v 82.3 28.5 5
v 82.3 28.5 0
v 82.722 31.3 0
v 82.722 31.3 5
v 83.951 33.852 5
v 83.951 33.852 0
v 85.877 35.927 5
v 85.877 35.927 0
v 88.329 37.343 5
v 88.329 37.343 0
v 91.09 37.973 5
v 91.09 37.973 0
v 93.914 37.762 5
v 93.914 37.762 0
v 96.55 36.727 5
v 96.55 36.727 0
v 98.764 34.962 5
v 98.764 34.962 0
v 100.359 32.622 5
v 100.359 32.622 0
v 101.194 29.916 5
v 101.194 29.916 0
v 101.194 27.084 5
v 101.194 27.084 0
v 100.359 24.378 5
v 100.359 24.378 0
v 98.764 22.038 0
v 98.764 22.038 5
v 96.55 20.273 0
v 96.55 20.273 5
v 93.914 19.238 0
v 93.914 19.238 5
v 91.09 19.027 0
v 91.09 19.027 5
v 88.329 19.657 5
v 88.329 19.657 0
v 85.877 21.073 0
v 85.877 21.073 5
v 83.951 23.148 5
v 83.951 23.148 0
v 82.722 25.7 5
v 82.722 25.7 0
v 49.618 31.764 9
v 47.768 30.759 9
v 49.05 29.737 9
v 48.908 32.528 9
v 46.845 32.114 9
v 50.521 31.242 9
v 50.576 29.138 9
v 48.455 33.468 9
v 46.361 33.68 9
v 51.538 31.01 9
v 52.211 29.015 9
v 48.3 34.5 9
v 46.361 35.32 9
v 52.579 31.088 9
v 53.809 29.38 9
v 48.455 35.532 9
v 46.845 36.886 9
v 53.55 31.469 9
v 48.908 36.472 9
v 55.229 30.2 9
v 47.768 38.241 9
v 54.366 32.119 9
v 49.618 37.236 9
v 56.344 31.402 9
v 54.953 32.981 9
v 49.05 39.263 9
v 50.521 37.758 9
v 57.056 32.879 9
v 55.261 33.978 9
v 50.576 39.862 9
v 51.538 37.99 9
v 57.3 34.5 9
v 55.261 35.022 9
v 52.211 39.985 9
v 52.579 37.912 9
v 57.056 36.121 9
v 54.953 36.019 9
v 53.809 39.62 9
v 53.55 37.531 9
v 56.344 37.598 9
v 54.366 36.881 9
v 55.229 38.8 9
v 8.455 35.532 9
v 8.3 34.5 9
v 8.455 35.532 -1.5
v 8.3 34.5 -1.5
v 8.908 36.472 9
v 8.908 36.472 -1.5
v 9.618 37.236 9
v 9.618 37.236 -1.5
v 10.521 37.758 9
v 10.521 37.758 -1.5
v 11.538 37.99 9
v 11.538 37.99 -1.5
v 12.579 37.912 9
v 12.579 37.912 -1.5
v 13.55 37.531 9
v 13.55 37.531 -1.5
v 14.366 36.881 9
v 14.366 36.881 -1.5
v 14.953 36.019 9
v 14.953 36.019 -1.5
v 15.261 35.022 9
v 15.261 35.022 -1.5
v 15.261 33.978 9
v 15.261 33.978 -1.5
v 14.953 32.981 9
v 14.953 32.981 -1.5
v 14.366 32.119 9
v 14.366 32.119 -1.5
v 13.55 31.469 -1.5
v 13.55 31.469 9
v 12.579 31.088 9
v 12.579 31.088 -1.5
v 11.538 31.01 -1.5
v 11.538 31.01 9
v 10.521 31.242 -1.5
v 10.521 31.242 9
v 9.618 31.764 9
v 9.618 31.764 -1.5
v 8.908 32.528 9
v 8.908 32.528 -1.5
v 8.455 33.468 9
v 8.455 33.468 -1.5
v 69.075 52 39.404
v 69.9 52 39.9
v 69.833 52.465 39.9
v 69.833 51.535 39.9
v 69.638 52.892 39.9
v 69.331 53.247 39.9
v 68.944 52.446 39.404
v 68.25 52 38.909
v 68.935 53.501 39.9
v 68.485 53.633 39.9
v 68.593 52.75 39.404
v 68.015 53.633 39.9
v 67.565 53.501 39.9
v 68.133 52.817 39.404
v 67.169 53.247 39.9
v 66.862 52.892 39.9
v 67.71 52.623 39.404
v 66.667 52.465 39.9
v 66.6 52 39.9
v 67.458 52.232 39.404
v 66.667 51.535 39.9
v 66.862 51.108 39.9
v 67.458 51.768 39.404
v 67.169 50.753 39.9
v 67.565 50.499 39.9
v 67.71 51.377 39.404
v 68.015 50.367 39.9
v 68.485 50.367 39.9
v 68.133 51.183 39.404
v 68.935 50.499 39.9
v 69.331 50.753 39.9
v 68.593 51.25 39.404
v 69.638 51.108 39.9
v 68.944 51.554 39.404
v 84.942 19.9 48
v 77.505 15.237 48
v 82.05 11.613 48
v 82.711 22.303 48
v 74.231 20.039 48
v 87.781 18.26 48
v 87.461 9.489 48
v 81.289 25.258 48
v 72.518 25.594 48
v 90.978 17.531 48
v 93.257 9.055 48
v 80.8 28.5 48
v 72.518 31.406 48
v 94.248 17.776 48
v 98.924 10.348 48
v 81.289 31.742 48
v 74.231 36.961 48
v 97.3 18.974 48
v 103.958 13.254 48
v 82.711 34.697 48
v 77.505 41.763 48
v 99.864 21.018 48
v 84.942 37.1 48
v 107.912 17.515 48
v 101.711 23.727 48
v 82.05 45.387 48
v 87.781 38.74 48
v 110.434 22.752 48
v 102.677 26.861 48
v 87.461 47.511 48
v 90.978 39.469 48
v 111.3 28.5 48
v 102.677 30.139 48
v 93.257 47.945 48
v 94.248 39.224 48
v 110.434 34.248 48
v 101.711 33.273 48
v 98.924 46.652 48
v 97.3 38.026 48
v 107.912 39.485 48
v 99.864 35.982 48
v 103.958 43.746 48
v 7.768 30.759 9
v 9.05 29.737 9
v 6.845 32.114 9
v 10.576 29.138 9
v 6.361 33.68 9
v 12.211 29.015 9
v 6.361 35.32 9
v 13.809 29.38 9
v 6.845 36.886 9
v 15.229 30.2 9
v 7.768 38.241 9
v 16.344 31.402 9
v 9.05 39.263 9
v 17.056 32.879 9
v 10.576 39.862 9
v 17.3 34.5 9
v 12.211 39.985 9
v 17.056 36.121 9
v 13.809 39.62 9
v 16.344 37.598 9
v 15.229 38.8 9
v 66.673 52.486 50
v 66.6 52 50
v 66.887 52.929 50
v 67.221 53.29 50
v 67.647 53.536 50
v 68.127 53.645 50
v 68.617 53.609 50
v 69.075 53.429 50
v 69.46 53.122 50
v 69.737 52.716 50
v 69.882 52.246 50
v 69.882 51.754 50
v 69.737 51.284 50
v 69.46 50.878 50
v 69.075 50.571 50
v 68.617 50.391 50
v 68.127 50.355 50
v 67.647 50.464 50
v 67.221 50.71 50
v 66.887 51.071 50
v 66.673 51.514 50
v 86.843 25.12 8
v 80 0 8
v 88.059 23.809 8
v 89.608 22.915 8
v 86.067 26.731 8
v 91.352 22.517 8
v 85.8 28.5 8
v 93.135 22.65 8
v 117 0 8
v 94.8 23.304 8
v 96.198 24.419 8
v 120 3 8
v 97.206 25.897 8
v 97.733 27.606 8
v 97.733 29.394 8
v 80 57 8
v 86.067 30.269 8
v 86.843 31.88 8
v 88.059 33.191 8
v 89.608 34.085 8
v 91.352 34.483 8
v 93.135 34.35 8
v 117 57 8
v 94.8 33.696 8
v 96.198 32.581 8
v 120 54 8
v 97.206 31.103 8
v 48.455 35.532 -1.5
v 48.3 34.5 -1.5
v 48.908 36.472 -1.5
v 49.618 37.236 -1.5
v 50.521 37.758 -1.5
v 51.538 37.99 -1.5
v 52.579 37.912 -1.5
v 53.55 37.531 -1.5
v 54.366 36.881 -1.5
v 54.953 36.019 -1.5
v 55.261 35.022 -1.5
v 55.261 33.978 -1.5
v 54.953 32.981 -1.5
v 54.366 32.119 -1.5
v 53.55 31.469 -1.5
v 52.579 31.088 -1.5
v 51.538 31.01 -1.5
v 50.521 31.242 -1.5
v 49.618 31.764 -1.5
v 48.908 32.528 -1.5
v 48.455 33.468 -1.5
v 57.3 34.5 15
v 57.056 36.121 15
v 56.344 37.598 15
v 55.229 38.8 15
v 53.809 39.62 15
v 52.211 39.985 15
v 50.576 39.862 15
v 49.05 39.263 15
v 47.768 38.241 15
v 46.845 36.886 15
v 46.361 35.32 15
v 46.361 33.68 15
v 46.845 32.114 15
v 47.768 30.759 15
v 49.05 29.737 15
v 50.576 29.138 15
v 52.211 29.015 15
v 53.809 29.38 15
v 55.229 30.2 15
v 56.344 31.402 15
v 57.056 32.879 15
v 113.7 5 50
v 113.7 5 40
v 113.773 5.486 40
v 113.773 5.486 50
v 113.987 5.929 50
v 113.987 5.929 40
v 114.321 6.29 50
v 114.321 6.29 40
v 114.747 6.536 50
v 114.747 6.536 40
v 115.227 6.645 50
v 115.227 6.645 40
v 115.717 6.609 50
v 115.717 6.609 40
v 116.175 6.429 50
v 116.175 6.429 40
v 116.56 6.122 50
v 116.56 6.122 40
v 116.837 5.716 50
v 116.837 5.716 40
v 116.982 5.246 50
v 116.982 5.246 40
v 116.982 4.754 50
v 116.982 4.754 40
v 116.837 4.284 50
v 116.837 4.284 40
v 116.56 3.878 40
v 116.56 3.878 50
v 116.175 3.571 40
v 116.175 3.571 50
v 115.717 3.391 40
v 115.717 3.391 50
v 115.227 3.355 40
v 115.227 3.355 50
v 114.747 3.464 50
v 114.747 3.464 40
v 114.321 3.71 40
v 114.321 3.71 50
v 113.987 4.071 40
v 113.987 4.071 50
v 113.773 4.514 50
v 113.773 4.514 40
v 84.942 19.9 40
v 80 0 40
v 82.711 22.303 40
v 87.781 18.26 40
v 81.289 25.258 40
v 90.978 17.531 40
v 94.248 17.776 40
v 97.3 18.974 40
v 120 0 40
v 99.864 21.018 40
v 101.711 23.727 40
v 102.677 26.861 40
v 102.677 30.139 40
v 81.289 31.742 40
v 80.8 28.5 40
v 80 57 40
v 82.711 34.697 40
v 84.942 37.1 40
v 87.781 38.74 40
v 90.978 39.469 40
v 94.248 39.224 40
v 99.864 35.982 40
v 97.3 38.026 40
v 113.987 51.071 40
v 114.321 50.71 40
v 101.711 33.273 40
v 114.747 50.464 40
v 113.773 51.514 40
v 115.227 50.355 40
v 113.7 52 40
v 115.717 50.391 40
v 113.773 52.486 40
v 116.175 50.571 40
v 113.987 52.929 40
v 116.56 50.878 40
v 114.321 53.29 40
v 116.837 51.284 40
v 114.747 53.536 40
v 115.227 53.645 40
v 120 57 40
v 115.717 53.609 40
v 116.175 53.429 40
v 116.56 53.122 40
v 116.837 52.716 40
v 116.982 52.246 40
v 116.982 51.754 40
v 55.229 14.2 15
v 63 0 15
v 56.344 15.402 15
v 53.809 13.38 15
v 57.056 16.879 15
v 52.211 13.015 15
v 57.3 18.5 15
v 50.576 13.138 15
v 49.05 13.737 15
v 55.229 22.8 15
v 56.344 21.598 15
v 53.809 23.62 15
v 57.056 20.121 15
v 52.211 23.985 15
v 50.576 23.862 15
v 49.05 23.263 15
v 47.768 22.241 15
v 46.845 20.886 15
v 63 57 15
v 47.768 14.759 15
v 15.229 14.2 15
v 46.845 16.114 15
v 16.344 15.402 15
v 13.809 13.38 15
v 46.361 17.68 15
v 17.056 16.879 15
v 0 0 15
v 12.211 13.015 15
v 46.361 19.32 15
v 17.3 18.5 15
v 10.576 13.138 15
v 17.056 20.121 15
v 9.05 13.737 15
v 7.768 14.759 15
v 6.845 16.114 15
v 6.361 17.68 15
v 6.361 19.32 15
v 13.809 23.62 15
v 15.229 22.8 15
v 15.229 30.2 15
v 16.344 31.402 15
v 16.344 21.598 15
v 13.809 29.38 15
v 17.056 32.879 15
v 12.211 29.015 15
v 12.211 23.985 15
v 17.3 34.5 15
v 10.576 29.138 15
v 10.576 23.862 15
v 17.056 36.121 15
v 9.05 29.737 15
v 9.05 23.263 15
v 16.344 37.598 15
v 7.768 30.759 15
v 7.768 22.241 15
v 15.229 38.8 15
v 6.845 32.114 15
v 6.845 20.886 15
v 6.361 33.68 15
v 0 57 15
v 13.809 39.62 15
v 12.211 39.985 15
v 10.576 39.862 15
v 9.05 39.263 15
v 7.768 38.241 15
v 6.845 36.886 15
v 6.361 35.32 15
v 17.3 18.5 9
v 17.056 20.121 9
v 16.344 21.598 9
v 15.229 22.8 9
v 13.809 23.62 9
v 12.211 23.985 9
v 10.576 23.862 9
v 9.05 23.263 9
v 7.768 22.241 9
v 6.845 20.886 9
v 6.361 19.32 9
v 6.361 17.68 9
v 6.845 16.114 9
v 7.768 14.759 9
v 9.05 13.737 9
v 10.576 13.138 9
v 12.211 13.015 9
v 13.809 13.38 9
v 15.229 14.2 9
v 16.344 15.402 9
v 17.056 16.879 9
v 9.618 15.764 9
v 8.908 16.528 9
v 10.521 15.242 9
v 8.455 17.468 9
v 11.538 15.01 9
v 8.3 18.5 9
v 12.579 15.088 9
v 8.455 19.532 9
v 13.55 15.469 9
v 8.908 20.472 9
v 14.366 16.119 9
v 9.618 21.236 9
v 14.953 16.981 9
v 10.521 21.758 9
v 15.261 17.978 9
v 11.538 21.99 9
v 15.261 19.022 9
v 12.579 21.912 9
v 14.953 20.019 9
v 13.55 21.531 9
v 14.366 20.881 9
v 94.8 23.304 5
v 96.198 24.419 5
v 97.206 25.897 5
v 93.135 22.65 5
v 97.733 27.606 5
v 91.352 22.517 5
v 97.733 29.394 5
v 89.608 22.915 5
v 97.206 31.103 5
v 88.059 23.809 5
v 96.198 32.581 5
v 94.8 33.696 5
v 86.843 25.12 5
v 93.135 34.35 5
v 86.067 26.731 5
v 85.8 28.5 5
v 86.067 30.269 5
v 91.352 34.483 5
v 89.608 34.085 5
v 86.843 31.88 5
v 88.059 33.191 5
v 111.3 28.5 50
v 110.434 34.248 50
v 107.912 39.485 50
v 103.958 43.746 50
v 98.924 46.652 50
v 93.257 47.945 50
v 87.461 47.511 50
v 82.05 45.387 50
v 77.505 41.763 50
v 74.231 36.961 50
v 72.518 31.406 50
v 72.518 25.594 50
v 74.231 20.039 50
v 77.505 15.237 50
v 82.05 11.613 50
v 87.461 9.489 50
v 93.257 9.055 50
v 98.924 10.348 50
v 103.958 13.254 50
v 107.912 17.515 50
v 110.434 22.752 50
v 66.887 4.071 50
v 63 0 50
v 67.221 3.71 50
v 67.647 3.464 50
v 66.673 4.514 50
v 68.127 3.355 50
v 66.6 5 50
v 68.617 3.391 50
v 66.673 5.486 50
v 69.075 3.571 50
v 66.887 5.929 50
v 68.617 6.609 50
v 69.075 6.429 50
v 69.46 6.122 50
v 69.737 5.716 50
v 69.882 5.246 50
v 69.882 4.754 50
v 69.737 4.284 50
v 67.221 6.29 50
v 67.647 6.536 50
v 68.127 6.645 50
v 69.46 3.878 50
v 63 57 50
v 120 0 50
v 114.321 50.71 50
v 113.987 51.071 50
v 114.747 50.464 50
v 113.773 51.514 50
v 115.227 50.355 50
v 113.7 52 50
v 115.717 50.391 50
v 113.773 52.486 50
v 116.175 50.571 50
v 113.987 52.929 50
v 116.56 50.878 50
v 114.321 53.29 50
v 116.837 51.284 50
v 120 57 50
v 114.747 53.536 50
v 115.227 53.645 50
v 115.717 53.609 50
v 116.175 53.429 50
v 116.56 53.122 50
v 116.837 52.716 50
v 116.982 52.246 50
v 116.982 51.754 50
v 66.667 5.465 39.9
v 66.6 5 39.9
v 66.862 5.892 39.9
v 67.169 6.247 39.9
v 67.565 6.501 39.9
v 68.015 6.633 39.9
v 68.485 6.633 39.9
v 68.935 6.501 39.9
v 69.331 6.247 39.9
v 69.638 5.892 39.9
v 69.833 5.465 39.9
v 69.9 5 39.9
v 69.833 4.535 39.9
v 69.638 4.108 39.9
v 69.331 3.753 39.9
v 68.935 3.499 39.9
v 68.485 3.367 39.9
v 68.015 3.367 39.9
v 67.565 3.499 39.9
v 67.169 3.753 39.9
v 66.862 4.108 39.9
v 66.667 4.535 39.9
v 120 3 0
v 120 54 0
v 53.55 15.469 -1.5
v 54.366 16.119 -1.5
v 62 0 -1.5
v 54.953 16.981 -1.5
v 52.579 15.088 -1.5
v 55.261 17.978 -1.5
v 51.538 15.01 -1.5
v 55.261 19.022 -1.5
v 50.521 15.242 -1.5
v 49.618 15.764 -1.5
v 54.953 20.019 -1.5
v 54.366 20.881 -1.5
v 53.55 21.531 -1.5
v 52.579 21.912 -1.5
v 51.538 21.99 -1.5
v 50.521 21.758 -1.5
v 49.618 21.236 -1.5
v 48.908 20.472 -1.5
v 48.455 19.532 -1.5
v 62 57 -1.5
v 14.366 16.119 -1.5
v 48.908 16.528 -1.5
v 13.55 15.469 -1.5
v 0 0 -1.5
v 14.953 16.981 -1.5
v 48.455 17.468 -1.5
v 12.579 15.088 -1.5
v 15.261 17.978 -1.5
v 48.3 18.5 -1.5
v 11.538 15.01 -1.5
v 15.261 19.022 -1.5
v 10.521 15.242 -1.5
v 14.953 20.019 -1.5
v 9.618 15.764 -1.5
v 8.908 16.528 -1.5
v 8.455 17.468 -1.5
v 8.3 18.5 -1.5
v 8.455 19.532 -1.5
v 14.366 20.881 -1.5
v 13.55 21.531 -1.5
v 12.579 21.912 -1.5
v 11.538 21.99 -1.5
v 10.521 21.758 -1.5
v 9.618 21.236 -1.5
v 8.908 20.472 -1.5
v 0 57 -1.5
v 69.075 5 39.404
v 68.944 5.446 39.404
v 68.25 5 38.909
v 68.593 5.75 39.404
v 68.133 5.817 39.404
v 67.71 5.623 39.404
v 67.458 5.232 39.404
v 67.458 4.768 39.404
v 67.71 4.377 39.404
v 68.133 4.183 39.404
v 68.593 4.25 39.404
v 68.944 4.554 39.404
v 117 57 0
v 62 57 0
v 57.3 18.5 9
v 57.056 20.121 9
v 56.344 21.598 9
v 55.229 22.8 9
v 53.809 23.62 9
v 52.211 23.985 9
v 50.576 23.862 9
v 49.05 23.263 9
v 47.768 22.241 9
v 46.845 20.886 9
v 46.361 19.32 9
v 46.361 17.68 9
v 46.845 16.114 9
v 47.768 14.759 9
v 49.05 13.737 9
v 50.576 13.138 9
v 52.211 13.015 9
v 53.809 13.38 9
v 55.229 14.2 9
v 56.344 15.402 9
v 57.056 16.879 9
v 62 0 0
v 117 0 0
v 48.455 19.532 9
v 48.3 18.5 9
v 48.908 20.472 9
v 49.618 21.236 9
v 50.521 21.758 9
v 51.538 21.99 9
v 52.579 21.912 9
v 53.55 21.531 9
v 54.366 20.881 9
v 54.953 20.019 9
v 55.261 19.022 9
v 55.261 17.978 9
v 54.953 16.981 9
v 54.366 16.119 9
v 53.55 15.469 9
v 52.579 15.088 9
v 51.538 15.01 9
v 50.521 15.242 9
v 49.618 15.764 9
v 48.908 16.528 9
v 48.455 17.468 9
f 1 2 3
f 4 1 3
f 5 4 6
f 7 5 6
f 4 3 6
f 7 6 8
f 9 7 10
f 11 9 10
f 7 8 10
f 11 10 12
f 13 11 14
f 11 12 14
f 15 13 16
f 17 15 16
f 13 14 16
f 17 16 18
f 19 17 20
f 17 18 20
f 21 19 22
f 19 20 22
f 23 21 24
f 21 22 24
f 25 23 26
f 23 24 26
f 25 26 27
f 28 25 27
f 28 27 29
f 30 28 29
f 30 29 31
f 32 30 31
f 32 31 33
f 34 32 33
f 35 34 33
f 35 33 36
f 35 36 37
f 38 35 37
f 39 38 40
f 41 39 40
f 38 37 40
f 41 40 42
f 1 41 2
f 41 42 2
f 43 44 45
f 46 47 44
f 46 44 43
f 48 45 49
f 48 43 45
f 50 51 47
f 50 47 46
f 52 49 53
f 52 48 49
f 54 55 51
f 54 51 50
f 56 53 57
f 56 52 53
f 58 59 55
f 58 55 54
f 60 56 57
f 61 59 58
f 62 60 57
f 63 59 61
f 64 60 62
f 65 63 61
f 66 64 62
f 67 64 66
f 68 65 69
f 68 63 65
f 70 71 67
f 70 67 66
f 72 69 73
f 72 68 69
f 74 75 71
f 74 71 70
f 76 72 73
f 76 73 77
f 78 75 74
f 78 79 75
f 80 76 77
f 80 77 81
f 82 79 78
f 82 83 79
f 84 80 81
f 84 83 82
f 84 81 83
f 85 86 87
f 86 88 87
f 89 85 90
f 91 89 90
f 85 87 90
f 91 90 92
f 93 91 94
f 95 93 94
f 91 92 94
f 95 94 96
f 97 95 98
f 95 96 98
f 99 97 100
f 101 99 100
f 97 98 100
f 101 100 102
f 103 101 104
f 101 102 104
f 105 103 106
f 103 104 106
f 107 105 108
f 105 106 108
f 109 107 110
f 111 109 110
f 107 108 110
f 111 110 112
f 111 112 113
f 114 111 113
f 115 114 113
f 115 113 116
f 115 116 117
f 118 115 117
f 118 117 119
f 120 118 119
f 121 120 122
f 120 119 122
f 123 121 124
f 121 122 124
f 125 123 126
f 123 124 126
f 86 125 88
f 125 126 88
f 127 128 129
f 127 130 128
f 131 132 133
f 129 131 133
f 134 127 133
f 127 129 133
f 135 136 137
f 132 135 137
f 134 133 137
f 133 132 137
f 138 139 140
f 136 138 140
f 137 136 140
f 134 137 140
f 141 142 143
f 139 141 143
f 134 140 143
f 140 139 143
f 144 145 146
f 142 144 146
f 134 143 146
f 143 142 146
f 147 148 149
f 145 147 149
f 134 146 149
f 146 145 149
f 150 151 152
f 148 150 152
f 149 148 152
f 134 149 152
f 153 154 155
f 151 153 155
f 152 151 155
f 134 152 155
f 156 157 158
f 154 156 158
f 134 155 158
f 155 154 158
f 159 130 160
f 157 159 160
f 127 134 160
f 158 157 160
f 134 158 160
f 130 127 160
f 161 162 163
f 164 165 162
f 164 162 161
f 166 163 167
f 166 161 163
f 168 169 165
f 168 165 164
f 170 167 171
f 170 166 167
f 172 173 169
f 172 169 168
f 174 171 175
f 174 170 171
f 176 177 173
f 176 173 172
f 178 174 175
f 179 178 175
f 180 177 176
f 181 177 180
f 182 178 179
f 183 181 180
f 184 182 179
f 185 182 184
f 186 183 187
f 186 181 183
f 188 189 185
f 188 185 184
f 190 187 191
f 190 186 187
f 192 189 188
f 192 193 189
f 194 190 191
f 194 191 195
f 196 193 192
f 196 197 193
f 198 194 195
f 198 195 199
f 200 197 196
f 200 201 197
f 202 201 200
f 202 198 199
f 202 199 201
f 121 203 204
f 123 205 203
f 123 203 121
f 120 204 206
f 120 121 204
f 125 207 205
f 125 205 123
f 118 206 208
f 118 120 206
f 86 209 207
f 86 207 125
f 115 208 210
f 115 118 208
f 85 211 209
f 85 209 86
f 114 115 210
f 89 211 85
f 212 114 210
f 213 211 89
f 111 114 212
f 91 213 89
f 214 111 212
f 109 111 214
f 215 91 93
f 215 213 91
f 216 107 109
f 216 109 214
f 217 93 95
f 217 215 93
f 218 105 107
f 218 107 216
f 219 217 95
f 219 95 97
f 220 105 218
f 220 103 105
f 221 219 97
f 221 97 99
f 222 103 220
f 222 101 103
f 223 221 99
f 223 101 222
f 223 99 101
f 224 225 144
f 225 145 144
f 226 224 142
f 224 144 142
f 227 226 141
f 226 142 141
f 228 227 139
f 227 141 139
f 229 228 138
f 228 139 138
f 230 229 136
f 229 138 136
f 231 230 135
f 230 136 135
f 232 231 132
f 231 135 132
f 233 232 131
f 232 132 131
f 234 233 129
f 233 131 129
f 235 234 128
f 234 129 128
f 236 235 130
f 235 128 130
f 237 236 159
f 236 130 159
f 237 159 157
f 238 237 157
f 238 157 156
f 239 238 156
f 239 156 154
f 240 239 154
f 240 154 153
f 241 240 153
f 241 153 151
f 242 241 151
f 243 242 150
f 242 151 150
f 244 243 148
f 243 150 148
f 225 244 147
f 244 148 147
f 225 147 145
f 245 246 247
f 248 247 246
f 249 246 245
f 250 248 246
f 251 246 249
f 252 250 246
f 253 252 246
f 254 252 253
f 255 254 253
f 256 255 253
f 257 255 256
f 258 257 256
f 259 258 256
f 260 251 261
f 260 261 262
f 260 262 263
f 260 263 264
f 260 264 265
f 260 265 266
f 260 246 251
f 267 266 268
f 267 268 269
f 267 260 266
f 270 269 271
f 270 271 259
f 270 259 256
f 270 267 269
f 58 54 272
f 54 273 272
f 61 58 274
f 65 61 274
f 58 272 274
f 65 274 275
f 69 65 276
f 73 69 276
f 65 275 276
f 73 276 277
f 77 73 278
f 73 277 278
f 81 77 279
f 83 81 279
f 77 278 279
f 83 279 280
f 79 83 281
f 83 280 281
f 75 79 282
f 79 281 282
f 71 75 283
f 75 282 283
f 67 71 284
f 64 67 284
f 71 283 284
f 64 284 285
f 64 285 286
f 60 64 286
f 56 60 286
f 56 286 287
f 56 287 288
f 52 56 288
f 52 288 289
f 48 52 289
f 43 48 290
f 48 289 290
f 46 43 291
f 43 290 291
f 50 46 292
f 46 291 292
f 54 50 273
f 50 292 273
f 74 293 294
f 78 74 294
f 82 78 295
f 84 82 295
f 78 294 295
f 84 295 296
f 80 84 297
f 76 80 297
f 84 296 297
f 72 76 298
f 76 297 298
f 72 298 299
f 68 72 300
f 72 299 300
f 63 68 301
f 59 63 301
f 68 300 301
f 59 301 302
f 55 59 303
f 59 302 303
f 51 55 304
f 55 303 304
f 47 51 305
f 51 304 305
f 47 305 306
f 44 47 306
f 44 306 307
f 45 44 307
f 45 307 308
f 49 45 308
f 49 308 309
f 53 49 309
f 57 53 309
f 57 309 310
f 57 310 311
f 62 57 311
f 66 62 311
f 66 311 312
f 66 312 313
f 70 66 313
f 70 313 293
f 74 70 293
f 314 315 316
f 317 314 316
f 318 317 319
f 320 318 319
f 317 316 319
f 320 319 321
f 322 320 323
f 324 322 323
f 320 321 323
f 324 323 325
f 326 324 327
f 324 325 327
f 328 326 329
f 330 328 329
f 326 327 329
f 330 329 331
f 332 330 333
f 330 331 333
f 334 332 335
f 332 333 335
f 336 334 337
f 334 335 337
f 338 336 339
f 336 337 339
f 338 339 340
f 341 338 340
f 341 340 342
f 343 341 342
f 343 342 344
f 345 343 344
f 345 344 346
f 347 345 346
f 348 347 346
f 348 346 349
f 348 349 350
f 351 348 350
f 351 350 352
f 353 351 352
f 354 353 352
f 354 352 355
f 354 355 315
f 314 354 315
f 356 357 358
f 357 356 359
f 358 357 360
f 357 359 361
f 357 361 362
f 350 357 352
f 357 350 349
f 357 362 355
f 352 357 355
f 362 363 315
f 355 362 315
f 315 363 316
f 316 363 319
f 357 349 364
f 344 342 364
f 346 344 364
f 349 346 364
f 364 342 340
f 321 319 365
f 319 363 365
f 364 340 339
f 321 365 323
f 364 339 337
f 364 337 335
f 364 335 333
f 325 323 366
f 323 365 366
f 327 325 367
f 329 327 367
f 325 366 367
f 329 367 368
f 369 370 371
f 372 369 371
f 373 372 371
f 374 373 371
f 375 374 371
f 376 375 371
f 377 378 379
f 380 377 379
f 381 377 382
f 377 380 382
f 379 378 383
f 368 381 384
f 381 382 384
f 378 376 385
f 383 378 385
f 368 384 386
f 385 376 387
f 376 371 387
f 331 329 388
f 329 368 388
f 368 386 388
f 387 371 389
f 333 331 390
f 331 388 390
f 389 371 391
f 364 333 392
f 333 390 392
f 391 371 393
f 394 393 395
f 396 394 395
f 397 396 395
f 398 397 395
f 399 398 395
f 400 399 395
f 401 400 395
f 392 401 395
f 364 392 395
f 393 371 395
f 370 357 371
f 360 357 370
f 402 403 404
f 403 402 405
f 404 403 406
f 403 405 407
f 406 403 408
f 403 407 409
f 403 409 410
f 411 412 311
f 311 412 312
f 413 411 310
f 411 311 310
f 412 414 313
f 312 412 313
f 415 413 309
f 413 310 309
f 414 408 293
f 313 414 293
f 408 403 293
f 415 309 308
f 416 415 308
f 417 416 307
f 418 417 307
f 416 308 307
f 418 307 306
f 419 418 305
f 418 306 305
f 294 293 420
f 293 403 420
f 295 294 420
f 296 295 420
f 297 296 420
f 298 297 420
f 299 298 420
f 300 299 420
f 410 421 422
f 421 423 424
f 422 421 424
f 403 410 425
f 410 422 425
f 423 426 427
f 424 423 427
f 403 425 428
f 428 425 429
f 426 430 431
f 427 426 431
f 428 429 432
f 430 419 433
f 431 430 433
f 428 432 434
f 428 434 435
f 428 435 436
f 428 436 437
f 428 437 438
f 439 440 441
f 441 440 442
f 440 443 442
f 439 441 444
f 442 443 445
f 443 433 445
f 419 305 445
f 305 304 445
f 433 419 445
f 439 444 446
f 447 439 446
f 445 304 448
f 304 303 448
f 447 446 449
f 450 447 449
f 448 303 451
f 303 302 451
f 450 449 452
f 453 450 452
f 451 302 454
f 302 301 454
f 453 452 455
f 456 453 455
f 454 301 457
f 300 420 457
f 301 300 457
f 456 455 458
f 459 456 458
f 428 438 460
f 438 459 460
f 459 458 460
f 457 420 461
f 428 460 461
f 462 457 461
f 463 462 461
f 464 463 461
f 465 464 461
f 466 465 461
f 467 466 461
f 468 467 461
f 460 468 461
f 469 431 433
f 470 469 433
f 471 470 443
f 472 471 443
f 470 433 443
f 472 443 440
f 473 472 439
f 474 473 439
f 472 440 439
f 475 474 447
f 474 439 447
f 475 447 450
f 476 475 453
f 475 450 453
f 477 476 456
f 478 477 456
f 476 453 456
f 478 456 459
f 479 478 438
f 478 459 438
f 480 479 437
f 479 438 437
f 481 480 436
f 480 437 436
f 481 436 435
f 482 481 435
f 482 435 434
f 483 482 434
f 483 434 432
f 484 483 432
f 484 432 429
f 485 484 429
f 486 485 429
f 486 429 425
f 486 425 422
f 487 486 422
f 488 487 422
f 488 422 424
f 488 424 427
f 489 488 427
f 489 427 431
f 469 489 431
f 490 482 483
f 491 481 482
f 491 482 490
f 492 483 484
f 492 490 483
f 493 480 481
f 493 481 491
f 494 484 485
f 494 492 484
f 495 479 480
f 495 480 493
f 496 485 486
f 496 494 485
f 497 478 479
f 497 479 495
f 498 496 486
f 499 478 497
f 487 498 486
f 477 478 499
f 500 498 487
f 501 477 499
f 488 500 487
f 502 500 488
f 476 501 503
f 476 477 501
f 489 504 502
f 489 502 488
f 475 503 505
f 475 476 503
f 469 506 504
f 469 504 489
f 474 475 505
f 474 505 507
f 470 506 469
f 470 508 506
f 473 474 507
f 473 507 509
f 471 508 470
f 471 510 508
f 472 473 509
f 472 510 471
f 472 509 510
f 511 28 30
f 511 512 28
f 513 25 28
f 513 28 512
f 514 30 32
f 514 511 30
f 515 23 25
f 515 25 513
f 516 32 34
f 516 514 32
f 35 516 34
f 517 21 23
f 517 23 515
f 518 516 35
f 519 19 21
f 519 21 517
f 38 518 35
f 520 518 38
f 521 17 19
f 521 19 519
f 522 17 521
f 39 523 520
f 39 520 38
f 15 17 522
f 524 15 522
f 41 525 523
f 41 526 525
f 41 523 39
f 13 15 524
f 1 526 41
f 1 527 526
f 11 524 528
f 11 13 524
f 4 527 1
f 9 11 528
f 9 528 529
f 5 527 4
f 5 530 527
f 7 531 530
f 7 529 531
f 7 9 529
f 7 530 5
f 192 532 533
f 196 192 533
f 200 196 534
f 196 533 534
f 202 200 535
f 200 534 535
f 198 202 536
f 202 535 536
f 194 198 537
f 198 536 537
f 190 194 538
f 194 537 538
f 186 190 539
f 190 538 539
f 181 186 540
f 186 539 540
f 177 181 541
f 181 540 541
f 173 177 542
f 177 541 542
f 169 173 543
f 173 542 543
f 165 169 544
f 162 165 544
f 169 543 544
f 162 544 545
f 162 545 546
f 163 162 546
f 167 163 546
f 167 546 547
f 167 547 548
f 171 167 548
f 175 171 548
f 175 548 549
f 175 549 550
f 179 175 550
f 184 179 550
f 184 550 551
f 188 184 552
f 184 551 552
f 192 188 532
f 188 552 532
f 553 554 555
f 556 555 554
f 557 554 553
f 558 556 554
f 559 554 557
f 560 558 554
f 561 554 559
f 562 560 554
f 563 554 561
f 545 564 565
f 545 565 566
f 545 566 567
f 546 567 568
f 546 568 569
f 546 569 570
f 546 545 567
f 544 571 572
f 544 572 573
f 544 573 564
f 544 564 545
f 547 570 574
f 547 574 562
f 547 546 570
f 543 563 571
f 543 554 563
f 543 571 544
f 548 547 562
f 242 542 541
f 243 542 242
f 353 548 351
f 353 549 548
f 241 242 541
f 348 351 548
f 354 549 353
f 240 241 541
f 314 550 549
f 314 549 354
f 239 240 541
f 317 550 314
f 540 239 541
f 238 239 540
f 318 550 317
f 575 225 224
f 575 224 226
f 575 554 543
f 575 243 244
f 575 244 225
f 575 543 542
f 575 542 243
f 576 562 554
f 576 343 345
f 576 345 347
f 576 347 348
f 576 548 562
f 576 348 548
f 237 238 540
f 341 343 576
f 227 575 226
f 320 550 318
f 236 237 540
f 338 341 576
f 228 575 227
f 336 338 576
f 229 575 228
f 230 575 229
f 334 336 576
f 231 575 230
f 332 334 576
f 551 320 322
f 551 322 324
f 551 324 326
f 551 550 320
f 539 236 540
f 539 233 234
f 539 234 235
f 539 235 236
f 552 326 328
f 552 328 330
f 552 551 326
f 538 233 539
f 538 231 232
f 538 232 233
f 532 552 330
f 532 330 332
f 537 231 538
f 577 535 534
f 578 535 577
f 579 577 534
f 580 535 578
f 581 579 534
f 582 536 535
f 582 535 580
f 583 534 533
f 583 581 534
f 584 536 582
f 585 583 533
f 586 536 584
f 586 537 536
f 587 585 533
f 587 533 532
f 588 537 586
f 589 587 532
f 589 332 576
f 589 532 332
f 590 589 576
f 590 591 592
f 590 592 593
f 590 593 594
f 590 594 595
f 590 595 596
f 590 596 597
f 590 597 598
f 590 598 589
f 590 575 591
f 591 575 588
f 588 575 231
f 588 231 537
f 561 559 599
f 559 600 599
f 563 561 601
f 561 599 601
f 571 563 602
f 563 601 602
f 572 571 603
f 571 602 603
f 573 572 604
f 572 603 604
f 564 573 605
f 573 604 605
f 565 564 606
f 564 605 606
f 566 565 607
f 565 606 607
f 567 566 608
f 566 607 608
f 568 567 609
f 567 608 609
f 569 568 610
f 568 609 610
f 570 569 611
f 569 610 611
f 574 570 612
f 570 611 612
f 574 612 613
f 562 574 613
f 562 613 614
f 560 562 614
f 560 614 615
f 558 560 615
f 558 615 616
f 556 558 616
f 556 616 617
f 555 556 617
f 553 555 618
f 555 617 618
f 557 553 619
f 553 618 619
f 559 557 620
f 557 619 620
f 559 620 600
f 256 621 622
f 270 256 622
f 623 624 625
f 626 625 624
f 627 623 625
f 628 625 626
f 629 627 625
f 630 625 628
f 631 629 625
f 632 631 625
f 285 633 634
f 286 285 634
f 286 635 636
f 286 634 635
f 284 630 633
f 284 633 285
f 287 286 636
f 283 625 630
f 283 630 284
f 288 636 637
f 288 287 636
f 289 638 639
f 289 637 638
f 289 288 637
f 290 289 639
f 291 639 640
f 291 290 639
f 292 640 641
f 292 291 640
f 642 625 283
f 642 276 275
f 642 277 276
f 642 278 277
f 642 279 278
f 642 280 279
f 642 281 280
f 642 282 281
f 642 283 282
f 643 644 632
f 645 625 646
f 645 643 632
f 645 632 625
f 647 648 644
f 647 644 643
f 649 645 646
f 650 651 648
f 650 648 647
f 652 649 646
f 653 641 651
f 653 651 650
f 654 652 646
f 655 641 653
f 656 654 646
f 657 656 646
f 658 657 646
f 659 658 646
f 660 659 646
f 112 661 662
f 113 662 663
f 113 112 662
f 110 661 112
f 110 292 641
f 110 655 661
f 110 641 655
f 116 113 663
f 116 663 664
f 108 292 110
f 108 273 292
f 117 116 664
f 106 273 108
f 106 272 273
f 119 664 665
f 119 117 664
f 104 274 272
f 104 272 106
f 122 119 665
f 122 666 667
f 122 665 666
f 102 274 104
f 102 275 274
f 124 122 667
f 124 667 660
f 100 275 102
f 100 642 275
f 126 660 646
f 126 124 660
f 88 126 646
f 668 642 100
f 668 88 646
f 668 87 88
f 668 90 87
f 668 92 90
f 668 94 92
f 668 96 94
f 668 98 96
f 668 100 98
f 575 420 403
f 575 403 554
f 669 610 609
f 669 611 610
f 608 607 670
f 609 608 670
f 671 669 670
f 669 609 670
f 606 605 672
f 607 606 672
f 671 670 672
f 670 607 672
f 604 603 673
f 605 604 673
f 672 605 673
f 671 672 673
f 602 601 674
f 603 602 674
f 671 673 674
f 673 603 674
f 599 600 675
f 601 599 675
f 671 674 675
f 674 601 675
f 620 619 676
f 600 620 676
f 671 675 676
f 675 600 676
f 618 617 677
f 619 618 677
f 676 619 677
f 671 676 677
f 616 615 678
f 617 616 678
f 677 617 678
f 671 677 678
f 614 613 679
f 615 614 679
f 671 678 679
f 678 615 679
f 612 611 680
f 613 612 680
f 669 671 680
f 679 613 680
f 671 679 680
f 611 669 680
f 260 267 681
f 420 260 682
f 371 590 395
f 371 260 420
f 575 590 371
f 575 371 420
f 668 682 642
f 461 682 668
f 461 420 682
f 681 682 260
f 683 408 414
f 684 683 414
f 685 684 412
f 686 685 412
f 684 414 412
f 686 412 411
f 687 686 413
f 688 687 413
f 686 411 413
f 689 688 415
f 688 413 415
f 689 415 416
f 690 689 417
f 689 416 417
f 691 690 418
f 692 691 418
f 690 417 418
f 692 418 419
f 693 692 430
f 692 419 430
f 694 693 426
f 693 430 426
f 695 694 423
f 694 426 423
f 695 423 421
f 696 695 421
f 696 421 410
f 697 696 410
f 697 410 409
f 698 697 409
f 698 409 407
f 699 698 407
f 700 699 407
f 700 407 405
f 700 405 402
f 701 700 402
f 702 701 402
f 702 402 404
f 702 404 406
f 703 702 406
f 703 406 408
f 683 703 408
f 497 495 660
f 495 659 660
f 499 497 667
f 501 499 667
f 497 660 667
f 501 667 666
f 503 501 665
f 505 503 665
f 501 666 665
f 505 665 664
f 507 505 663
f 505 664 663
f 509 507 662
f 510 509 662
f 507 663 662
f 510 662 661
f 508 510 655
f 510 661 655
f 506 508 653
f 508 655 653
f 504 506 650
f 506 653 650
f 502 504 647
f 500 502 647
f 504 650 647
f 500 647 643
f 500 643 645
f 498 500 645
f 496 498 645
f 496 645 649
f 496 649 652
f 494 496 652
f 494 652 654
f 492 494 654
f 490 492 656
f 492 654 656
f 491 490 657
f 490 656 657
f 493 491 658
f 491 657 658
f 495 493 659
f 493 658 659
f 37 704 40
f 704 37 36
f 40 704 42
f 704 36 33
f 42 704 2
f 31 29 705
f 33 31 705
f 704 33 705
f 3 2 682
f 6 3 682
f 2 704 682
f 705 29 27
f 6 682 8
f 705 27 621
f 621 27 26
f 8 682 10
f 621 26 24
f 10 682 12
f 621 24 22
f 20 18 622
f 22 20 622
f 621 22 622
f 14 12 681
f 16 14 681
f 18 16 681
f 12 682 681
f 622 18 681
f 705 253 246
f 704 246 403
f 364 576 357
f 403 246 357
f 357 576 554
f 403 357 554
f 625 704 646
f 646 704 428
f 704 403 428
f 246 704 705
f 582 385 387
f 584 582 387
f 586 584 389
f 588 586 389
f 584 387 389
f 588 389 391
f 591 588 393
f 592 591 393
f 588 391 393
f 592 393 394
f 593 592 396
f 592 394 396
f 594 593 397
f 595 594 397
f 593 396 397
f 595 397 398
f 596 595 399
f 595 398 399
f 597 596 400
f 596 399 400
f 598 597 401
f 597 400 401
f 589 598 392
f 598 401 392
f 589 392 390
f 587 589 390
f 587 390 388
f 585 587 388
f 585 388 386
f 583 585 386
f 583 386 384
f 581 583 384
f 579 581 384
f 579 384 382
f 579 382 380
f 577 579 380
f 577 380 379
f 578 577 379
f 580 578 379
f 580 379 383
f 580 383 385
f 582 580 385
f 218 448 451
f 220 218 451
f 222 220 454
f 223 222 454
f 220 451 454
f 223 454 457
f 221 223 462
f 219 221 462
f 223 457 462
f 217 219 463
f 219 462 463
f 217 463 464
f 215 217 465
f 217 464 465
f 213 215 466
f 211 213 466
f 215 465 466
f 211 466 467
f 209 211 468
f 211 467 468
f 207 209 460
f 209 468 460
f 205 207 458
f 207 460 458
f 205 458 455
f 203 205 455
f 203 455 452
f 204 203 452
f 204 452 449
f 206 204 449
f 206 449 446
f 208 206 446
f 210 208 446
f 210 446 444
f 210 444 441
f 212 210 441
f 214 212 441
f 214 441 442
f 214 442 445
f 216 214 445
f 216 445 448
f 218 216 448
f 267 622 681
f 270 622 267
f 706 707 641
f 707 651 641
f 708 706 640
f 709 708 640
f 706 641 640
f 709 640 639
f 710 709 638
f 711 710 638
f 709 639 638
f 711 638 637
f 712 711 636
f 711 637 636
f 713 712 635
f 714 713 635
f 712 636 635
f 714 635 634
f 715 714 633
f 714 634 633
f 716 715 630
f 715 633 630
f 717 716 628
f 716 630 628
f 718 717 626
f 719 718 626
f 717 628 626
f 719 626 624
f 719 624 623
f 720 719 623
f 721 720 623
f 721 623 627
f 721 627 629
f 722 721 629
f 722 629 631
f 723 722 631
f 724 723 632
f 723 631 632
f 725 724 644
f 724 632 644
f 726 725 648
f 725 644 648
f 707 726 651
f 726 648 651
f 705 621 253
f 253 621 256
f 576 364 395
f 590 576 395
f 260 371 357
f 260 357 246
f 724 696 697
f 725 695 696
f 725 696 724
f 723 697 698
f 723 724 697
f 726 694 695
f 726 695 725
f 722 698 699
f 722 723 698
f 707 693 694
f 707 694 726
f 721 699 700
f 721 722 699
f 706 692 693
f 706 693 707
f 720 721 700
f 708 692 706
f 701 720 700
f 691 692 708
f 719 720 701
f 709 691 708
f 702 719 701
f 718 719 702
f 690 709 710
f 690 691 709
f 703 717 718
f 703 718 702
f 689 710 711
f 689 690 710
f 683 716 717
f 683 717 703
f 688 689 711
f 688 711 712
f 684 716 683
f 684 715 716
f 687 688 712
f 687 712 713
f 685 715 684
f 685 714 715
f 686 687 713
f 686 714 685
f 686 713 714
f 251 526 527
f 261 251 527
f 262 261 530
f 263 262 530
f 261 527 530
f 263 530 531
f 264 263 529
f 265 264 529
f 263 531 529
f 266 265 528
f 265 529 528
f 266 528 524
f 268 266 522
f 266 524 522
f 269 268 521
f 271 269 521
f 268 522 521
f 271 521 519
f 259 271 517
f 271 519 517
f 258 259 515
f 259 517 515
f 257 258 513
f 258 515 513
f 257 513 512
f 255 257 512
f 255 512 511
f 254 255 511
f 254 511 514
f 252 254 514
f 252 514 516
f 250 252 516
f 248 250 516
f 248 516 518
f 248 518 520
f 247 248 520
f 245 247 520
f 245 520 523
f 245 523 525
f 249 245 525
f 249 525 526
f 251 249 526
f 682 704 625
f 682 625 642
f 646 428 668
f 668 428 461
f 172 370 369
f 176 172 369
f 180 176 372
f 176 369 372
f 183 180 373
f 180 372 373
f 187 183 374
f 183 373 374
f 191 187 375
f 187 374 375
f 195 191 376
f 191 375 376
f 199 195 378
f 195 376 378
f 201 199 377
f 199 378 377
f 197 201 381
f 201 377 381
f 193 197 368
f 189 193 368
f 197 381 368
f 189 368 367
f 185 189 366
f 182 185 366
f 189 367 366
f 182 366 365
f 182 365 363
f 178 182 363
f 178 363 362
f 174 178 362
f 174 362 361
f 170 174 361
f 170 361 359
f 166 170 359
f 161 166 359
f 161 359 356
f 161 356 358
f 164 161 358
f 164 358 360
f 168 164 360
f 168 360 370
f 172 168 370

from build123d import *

# Parameters (mm, degrees)
SKETCH_1_W                   = 120
SKETCH_1_H                   = 57
EXTRUDE_1_DEPTH              = 50
SKETCH_2_W                   = 40
SKETCH_2_H                   = 32
CUT_EXTRUDE_1_DEPTH          = 142.947173272
SKETCH_3_W                   = 63
SKETCH_3_H                   = 35
CUT_EXTRUDE_2_DEPTH          = 142.947173272
SKETCH_4_W                   = 62
SKETCH_4_H                   = 57
EXTRUDE_2_DEPTH              = 1.5
SKETCH_5_R                   = 9.5
CUT_EXTRUDE_3_DEPTH          = 5
SKETCH_6_R                   = 6
CUT_EXTRUDE_4_DEPTH          = 20
SKETCH_7_R                   = 11
CUT_EXTRUDE_5_DEPTH          = 140.180638021
CHAMFER_1_SIZE               = 3
SKETCH_8_R                   = 19.5
CUT_EXTRUDE_6_DEPTH          = 2
HOLE_WIZARD_M6_1_D           = 7
HOLE_WIZARD_M6_1_CBORE_D     = 11
HOLE_WIZARD_M6_1_CBORE_DEPTH = 6
HOLE_WIZARD_M4_1_D           = 3.3
HOLE_WIZARD_M4_1_DEPTH       = 10.1
HOLE_WIZARD_M4_1_TIP         = 0.991420021


with BuildPart() as part:
    # 草图1 → 凸台-拉伸1 (new body)
    with BuildSketch(Plane.XY):
        with Locations((60, 28.5)):
            Rectangle(SKETCH_1_W, SKETCH_1_H)
    extrude(amount=EXTRUDE_1_DEPTH)

    # 草图2 → 切除-拉伸1 (cut, through all)
    with BuildSketch(Plane(origin=(0, 57, 0), x_dir=(1, 0, 0), z_dir=(0, 1, 0))):
        with Locations((100, -24)):
            Rectangle(SKETCH_2_W, SKETCH_2_H)
    extrude(amount=-CUT_EXTRUDE_1_DEPTH, mode=Mode.SUBTRACT)

    # 草图3 → 切除-拉伸2 (cut, through all)
    with BuildSketch(Plane(origin=(0, 57, 0), x_dir=(-1, 0, 0), z_dir=(0, 1, 0))):
        with Locations((-31.5, 32.5)):
            Rectangle(SKETCH_3_W, SKETCH_3_H)
    extrude(amount=-CUT_EXTRUDE_2_DEPTH, mode=Mode.SUBTRACT)

    # 草图4 → 凸台-拉伸2 (add)
    with BuildSketch(Plane(origin=(0, 0, 0), x_dir=(-1, 0, 0), z_dir=(0, 0, -1))):
        with Locations((-31, 28.5)):
            Rectangle(SKETCH_4_W, SKETCH_4_H)
    extrude(amount=EXTRUDE_2_DEPTH)

    # 草图5 → 切除-拉伸3 (cut)
    with BuildSketch(Plane(origin=(0, 0, 0), x_dir=(-1, 0, 0), z_dir=(0, 0, -1))):
        with Locations((-91.8, 28.5)):
            Circle(SKETCH_5_R)
    extrude(amount=-CUT_EXTRUDE_3_DEPTH, mode=Mode.SUBTRACT)

    # 草图6 → 切除-拉伸4 (cut)
    with BuildSketch(Plane(origin=(0, 0, 5), x_dir=(-1, 0, 0), z_dir=(0, 0, -1))):
        with Locations((-91.8, 28.5)):
            Circle(SKETCH_6_R)
    extrude(amount=-CUT_EXTRUDE_4_DEPTH, mode=Mode.SUBTRACT)

    # 草图7 → 切除-拉伸5 (cut, through all)
    with BuildSketch(Plane(origin=(0, 0, 40), x_dir=(-1, 0, 0), z_dir=(0, 0, -1))):
        with Locations((-91.8, 28.5)):
            Circle(SKETCH_7_R)
    extrude(amount=-CUT_EXTRUDE_5_DEPTH, mode=Mode.SUBTRACT)

    # 倒角1
    chamfer_1_edges = [part.edges().sort_by_distance(p)[0] for p in [
        (120, 0, 4),
        (120, 57, 4),
    ]]
    chamfer(chamfer_1_edges, length=CHAMFER_1_SIZE)

    # 草图8 → 切除-拉伸6 (cut)
    with BuildSketch(Plane.XY.offset(50)):
        with Locations((91.8, 28.5)):
            Circle(SKETCH_8_R)
    extrude(amount=-CUT_EXTRUDE_6_DEPTH, mode=Mode.SUBTRACT)

    # M6 六角凹头螺钉的柱形沉头孔1 (through all)
    with Locations(Plane.XY.offset(15)):
        with Locations((11.8, 34.5), (11.8, 18.5), (51.8, 18.5), (51.8, 34.5)):
            CounterBoreHole(HOLE_WIZARD_M6_1_D / 2, HOLE_WIZARD_M6_1_CBORE_D / 2, HOLE_WIZARD_M6_1_CBORE_DEPTH)

    # M4 螺纹孔1
    with Locations(Plane.XY.offset(50)):
        with Locations((68.25, 52), (115.35, 5), (115.35, 52), (68.25, 5)):
            Hole(HOLE_WIZARD_M4_1_D / 2, depth=HOLE_WIZARD_M4_1_DEPTH)
            with Locations((0, 0, -(HOLE_WIZARD_M4_1_DEPTH + HOLE_WIZARD_M4_1_TIP / 2))):  # 118° drill point
                Cone(0, HOLE_WIZARD_M4_1_D / 2, HOLE_WIZARD_M4_1_TIP, mode=Mode.SUBTRACT)


solid = part.part
